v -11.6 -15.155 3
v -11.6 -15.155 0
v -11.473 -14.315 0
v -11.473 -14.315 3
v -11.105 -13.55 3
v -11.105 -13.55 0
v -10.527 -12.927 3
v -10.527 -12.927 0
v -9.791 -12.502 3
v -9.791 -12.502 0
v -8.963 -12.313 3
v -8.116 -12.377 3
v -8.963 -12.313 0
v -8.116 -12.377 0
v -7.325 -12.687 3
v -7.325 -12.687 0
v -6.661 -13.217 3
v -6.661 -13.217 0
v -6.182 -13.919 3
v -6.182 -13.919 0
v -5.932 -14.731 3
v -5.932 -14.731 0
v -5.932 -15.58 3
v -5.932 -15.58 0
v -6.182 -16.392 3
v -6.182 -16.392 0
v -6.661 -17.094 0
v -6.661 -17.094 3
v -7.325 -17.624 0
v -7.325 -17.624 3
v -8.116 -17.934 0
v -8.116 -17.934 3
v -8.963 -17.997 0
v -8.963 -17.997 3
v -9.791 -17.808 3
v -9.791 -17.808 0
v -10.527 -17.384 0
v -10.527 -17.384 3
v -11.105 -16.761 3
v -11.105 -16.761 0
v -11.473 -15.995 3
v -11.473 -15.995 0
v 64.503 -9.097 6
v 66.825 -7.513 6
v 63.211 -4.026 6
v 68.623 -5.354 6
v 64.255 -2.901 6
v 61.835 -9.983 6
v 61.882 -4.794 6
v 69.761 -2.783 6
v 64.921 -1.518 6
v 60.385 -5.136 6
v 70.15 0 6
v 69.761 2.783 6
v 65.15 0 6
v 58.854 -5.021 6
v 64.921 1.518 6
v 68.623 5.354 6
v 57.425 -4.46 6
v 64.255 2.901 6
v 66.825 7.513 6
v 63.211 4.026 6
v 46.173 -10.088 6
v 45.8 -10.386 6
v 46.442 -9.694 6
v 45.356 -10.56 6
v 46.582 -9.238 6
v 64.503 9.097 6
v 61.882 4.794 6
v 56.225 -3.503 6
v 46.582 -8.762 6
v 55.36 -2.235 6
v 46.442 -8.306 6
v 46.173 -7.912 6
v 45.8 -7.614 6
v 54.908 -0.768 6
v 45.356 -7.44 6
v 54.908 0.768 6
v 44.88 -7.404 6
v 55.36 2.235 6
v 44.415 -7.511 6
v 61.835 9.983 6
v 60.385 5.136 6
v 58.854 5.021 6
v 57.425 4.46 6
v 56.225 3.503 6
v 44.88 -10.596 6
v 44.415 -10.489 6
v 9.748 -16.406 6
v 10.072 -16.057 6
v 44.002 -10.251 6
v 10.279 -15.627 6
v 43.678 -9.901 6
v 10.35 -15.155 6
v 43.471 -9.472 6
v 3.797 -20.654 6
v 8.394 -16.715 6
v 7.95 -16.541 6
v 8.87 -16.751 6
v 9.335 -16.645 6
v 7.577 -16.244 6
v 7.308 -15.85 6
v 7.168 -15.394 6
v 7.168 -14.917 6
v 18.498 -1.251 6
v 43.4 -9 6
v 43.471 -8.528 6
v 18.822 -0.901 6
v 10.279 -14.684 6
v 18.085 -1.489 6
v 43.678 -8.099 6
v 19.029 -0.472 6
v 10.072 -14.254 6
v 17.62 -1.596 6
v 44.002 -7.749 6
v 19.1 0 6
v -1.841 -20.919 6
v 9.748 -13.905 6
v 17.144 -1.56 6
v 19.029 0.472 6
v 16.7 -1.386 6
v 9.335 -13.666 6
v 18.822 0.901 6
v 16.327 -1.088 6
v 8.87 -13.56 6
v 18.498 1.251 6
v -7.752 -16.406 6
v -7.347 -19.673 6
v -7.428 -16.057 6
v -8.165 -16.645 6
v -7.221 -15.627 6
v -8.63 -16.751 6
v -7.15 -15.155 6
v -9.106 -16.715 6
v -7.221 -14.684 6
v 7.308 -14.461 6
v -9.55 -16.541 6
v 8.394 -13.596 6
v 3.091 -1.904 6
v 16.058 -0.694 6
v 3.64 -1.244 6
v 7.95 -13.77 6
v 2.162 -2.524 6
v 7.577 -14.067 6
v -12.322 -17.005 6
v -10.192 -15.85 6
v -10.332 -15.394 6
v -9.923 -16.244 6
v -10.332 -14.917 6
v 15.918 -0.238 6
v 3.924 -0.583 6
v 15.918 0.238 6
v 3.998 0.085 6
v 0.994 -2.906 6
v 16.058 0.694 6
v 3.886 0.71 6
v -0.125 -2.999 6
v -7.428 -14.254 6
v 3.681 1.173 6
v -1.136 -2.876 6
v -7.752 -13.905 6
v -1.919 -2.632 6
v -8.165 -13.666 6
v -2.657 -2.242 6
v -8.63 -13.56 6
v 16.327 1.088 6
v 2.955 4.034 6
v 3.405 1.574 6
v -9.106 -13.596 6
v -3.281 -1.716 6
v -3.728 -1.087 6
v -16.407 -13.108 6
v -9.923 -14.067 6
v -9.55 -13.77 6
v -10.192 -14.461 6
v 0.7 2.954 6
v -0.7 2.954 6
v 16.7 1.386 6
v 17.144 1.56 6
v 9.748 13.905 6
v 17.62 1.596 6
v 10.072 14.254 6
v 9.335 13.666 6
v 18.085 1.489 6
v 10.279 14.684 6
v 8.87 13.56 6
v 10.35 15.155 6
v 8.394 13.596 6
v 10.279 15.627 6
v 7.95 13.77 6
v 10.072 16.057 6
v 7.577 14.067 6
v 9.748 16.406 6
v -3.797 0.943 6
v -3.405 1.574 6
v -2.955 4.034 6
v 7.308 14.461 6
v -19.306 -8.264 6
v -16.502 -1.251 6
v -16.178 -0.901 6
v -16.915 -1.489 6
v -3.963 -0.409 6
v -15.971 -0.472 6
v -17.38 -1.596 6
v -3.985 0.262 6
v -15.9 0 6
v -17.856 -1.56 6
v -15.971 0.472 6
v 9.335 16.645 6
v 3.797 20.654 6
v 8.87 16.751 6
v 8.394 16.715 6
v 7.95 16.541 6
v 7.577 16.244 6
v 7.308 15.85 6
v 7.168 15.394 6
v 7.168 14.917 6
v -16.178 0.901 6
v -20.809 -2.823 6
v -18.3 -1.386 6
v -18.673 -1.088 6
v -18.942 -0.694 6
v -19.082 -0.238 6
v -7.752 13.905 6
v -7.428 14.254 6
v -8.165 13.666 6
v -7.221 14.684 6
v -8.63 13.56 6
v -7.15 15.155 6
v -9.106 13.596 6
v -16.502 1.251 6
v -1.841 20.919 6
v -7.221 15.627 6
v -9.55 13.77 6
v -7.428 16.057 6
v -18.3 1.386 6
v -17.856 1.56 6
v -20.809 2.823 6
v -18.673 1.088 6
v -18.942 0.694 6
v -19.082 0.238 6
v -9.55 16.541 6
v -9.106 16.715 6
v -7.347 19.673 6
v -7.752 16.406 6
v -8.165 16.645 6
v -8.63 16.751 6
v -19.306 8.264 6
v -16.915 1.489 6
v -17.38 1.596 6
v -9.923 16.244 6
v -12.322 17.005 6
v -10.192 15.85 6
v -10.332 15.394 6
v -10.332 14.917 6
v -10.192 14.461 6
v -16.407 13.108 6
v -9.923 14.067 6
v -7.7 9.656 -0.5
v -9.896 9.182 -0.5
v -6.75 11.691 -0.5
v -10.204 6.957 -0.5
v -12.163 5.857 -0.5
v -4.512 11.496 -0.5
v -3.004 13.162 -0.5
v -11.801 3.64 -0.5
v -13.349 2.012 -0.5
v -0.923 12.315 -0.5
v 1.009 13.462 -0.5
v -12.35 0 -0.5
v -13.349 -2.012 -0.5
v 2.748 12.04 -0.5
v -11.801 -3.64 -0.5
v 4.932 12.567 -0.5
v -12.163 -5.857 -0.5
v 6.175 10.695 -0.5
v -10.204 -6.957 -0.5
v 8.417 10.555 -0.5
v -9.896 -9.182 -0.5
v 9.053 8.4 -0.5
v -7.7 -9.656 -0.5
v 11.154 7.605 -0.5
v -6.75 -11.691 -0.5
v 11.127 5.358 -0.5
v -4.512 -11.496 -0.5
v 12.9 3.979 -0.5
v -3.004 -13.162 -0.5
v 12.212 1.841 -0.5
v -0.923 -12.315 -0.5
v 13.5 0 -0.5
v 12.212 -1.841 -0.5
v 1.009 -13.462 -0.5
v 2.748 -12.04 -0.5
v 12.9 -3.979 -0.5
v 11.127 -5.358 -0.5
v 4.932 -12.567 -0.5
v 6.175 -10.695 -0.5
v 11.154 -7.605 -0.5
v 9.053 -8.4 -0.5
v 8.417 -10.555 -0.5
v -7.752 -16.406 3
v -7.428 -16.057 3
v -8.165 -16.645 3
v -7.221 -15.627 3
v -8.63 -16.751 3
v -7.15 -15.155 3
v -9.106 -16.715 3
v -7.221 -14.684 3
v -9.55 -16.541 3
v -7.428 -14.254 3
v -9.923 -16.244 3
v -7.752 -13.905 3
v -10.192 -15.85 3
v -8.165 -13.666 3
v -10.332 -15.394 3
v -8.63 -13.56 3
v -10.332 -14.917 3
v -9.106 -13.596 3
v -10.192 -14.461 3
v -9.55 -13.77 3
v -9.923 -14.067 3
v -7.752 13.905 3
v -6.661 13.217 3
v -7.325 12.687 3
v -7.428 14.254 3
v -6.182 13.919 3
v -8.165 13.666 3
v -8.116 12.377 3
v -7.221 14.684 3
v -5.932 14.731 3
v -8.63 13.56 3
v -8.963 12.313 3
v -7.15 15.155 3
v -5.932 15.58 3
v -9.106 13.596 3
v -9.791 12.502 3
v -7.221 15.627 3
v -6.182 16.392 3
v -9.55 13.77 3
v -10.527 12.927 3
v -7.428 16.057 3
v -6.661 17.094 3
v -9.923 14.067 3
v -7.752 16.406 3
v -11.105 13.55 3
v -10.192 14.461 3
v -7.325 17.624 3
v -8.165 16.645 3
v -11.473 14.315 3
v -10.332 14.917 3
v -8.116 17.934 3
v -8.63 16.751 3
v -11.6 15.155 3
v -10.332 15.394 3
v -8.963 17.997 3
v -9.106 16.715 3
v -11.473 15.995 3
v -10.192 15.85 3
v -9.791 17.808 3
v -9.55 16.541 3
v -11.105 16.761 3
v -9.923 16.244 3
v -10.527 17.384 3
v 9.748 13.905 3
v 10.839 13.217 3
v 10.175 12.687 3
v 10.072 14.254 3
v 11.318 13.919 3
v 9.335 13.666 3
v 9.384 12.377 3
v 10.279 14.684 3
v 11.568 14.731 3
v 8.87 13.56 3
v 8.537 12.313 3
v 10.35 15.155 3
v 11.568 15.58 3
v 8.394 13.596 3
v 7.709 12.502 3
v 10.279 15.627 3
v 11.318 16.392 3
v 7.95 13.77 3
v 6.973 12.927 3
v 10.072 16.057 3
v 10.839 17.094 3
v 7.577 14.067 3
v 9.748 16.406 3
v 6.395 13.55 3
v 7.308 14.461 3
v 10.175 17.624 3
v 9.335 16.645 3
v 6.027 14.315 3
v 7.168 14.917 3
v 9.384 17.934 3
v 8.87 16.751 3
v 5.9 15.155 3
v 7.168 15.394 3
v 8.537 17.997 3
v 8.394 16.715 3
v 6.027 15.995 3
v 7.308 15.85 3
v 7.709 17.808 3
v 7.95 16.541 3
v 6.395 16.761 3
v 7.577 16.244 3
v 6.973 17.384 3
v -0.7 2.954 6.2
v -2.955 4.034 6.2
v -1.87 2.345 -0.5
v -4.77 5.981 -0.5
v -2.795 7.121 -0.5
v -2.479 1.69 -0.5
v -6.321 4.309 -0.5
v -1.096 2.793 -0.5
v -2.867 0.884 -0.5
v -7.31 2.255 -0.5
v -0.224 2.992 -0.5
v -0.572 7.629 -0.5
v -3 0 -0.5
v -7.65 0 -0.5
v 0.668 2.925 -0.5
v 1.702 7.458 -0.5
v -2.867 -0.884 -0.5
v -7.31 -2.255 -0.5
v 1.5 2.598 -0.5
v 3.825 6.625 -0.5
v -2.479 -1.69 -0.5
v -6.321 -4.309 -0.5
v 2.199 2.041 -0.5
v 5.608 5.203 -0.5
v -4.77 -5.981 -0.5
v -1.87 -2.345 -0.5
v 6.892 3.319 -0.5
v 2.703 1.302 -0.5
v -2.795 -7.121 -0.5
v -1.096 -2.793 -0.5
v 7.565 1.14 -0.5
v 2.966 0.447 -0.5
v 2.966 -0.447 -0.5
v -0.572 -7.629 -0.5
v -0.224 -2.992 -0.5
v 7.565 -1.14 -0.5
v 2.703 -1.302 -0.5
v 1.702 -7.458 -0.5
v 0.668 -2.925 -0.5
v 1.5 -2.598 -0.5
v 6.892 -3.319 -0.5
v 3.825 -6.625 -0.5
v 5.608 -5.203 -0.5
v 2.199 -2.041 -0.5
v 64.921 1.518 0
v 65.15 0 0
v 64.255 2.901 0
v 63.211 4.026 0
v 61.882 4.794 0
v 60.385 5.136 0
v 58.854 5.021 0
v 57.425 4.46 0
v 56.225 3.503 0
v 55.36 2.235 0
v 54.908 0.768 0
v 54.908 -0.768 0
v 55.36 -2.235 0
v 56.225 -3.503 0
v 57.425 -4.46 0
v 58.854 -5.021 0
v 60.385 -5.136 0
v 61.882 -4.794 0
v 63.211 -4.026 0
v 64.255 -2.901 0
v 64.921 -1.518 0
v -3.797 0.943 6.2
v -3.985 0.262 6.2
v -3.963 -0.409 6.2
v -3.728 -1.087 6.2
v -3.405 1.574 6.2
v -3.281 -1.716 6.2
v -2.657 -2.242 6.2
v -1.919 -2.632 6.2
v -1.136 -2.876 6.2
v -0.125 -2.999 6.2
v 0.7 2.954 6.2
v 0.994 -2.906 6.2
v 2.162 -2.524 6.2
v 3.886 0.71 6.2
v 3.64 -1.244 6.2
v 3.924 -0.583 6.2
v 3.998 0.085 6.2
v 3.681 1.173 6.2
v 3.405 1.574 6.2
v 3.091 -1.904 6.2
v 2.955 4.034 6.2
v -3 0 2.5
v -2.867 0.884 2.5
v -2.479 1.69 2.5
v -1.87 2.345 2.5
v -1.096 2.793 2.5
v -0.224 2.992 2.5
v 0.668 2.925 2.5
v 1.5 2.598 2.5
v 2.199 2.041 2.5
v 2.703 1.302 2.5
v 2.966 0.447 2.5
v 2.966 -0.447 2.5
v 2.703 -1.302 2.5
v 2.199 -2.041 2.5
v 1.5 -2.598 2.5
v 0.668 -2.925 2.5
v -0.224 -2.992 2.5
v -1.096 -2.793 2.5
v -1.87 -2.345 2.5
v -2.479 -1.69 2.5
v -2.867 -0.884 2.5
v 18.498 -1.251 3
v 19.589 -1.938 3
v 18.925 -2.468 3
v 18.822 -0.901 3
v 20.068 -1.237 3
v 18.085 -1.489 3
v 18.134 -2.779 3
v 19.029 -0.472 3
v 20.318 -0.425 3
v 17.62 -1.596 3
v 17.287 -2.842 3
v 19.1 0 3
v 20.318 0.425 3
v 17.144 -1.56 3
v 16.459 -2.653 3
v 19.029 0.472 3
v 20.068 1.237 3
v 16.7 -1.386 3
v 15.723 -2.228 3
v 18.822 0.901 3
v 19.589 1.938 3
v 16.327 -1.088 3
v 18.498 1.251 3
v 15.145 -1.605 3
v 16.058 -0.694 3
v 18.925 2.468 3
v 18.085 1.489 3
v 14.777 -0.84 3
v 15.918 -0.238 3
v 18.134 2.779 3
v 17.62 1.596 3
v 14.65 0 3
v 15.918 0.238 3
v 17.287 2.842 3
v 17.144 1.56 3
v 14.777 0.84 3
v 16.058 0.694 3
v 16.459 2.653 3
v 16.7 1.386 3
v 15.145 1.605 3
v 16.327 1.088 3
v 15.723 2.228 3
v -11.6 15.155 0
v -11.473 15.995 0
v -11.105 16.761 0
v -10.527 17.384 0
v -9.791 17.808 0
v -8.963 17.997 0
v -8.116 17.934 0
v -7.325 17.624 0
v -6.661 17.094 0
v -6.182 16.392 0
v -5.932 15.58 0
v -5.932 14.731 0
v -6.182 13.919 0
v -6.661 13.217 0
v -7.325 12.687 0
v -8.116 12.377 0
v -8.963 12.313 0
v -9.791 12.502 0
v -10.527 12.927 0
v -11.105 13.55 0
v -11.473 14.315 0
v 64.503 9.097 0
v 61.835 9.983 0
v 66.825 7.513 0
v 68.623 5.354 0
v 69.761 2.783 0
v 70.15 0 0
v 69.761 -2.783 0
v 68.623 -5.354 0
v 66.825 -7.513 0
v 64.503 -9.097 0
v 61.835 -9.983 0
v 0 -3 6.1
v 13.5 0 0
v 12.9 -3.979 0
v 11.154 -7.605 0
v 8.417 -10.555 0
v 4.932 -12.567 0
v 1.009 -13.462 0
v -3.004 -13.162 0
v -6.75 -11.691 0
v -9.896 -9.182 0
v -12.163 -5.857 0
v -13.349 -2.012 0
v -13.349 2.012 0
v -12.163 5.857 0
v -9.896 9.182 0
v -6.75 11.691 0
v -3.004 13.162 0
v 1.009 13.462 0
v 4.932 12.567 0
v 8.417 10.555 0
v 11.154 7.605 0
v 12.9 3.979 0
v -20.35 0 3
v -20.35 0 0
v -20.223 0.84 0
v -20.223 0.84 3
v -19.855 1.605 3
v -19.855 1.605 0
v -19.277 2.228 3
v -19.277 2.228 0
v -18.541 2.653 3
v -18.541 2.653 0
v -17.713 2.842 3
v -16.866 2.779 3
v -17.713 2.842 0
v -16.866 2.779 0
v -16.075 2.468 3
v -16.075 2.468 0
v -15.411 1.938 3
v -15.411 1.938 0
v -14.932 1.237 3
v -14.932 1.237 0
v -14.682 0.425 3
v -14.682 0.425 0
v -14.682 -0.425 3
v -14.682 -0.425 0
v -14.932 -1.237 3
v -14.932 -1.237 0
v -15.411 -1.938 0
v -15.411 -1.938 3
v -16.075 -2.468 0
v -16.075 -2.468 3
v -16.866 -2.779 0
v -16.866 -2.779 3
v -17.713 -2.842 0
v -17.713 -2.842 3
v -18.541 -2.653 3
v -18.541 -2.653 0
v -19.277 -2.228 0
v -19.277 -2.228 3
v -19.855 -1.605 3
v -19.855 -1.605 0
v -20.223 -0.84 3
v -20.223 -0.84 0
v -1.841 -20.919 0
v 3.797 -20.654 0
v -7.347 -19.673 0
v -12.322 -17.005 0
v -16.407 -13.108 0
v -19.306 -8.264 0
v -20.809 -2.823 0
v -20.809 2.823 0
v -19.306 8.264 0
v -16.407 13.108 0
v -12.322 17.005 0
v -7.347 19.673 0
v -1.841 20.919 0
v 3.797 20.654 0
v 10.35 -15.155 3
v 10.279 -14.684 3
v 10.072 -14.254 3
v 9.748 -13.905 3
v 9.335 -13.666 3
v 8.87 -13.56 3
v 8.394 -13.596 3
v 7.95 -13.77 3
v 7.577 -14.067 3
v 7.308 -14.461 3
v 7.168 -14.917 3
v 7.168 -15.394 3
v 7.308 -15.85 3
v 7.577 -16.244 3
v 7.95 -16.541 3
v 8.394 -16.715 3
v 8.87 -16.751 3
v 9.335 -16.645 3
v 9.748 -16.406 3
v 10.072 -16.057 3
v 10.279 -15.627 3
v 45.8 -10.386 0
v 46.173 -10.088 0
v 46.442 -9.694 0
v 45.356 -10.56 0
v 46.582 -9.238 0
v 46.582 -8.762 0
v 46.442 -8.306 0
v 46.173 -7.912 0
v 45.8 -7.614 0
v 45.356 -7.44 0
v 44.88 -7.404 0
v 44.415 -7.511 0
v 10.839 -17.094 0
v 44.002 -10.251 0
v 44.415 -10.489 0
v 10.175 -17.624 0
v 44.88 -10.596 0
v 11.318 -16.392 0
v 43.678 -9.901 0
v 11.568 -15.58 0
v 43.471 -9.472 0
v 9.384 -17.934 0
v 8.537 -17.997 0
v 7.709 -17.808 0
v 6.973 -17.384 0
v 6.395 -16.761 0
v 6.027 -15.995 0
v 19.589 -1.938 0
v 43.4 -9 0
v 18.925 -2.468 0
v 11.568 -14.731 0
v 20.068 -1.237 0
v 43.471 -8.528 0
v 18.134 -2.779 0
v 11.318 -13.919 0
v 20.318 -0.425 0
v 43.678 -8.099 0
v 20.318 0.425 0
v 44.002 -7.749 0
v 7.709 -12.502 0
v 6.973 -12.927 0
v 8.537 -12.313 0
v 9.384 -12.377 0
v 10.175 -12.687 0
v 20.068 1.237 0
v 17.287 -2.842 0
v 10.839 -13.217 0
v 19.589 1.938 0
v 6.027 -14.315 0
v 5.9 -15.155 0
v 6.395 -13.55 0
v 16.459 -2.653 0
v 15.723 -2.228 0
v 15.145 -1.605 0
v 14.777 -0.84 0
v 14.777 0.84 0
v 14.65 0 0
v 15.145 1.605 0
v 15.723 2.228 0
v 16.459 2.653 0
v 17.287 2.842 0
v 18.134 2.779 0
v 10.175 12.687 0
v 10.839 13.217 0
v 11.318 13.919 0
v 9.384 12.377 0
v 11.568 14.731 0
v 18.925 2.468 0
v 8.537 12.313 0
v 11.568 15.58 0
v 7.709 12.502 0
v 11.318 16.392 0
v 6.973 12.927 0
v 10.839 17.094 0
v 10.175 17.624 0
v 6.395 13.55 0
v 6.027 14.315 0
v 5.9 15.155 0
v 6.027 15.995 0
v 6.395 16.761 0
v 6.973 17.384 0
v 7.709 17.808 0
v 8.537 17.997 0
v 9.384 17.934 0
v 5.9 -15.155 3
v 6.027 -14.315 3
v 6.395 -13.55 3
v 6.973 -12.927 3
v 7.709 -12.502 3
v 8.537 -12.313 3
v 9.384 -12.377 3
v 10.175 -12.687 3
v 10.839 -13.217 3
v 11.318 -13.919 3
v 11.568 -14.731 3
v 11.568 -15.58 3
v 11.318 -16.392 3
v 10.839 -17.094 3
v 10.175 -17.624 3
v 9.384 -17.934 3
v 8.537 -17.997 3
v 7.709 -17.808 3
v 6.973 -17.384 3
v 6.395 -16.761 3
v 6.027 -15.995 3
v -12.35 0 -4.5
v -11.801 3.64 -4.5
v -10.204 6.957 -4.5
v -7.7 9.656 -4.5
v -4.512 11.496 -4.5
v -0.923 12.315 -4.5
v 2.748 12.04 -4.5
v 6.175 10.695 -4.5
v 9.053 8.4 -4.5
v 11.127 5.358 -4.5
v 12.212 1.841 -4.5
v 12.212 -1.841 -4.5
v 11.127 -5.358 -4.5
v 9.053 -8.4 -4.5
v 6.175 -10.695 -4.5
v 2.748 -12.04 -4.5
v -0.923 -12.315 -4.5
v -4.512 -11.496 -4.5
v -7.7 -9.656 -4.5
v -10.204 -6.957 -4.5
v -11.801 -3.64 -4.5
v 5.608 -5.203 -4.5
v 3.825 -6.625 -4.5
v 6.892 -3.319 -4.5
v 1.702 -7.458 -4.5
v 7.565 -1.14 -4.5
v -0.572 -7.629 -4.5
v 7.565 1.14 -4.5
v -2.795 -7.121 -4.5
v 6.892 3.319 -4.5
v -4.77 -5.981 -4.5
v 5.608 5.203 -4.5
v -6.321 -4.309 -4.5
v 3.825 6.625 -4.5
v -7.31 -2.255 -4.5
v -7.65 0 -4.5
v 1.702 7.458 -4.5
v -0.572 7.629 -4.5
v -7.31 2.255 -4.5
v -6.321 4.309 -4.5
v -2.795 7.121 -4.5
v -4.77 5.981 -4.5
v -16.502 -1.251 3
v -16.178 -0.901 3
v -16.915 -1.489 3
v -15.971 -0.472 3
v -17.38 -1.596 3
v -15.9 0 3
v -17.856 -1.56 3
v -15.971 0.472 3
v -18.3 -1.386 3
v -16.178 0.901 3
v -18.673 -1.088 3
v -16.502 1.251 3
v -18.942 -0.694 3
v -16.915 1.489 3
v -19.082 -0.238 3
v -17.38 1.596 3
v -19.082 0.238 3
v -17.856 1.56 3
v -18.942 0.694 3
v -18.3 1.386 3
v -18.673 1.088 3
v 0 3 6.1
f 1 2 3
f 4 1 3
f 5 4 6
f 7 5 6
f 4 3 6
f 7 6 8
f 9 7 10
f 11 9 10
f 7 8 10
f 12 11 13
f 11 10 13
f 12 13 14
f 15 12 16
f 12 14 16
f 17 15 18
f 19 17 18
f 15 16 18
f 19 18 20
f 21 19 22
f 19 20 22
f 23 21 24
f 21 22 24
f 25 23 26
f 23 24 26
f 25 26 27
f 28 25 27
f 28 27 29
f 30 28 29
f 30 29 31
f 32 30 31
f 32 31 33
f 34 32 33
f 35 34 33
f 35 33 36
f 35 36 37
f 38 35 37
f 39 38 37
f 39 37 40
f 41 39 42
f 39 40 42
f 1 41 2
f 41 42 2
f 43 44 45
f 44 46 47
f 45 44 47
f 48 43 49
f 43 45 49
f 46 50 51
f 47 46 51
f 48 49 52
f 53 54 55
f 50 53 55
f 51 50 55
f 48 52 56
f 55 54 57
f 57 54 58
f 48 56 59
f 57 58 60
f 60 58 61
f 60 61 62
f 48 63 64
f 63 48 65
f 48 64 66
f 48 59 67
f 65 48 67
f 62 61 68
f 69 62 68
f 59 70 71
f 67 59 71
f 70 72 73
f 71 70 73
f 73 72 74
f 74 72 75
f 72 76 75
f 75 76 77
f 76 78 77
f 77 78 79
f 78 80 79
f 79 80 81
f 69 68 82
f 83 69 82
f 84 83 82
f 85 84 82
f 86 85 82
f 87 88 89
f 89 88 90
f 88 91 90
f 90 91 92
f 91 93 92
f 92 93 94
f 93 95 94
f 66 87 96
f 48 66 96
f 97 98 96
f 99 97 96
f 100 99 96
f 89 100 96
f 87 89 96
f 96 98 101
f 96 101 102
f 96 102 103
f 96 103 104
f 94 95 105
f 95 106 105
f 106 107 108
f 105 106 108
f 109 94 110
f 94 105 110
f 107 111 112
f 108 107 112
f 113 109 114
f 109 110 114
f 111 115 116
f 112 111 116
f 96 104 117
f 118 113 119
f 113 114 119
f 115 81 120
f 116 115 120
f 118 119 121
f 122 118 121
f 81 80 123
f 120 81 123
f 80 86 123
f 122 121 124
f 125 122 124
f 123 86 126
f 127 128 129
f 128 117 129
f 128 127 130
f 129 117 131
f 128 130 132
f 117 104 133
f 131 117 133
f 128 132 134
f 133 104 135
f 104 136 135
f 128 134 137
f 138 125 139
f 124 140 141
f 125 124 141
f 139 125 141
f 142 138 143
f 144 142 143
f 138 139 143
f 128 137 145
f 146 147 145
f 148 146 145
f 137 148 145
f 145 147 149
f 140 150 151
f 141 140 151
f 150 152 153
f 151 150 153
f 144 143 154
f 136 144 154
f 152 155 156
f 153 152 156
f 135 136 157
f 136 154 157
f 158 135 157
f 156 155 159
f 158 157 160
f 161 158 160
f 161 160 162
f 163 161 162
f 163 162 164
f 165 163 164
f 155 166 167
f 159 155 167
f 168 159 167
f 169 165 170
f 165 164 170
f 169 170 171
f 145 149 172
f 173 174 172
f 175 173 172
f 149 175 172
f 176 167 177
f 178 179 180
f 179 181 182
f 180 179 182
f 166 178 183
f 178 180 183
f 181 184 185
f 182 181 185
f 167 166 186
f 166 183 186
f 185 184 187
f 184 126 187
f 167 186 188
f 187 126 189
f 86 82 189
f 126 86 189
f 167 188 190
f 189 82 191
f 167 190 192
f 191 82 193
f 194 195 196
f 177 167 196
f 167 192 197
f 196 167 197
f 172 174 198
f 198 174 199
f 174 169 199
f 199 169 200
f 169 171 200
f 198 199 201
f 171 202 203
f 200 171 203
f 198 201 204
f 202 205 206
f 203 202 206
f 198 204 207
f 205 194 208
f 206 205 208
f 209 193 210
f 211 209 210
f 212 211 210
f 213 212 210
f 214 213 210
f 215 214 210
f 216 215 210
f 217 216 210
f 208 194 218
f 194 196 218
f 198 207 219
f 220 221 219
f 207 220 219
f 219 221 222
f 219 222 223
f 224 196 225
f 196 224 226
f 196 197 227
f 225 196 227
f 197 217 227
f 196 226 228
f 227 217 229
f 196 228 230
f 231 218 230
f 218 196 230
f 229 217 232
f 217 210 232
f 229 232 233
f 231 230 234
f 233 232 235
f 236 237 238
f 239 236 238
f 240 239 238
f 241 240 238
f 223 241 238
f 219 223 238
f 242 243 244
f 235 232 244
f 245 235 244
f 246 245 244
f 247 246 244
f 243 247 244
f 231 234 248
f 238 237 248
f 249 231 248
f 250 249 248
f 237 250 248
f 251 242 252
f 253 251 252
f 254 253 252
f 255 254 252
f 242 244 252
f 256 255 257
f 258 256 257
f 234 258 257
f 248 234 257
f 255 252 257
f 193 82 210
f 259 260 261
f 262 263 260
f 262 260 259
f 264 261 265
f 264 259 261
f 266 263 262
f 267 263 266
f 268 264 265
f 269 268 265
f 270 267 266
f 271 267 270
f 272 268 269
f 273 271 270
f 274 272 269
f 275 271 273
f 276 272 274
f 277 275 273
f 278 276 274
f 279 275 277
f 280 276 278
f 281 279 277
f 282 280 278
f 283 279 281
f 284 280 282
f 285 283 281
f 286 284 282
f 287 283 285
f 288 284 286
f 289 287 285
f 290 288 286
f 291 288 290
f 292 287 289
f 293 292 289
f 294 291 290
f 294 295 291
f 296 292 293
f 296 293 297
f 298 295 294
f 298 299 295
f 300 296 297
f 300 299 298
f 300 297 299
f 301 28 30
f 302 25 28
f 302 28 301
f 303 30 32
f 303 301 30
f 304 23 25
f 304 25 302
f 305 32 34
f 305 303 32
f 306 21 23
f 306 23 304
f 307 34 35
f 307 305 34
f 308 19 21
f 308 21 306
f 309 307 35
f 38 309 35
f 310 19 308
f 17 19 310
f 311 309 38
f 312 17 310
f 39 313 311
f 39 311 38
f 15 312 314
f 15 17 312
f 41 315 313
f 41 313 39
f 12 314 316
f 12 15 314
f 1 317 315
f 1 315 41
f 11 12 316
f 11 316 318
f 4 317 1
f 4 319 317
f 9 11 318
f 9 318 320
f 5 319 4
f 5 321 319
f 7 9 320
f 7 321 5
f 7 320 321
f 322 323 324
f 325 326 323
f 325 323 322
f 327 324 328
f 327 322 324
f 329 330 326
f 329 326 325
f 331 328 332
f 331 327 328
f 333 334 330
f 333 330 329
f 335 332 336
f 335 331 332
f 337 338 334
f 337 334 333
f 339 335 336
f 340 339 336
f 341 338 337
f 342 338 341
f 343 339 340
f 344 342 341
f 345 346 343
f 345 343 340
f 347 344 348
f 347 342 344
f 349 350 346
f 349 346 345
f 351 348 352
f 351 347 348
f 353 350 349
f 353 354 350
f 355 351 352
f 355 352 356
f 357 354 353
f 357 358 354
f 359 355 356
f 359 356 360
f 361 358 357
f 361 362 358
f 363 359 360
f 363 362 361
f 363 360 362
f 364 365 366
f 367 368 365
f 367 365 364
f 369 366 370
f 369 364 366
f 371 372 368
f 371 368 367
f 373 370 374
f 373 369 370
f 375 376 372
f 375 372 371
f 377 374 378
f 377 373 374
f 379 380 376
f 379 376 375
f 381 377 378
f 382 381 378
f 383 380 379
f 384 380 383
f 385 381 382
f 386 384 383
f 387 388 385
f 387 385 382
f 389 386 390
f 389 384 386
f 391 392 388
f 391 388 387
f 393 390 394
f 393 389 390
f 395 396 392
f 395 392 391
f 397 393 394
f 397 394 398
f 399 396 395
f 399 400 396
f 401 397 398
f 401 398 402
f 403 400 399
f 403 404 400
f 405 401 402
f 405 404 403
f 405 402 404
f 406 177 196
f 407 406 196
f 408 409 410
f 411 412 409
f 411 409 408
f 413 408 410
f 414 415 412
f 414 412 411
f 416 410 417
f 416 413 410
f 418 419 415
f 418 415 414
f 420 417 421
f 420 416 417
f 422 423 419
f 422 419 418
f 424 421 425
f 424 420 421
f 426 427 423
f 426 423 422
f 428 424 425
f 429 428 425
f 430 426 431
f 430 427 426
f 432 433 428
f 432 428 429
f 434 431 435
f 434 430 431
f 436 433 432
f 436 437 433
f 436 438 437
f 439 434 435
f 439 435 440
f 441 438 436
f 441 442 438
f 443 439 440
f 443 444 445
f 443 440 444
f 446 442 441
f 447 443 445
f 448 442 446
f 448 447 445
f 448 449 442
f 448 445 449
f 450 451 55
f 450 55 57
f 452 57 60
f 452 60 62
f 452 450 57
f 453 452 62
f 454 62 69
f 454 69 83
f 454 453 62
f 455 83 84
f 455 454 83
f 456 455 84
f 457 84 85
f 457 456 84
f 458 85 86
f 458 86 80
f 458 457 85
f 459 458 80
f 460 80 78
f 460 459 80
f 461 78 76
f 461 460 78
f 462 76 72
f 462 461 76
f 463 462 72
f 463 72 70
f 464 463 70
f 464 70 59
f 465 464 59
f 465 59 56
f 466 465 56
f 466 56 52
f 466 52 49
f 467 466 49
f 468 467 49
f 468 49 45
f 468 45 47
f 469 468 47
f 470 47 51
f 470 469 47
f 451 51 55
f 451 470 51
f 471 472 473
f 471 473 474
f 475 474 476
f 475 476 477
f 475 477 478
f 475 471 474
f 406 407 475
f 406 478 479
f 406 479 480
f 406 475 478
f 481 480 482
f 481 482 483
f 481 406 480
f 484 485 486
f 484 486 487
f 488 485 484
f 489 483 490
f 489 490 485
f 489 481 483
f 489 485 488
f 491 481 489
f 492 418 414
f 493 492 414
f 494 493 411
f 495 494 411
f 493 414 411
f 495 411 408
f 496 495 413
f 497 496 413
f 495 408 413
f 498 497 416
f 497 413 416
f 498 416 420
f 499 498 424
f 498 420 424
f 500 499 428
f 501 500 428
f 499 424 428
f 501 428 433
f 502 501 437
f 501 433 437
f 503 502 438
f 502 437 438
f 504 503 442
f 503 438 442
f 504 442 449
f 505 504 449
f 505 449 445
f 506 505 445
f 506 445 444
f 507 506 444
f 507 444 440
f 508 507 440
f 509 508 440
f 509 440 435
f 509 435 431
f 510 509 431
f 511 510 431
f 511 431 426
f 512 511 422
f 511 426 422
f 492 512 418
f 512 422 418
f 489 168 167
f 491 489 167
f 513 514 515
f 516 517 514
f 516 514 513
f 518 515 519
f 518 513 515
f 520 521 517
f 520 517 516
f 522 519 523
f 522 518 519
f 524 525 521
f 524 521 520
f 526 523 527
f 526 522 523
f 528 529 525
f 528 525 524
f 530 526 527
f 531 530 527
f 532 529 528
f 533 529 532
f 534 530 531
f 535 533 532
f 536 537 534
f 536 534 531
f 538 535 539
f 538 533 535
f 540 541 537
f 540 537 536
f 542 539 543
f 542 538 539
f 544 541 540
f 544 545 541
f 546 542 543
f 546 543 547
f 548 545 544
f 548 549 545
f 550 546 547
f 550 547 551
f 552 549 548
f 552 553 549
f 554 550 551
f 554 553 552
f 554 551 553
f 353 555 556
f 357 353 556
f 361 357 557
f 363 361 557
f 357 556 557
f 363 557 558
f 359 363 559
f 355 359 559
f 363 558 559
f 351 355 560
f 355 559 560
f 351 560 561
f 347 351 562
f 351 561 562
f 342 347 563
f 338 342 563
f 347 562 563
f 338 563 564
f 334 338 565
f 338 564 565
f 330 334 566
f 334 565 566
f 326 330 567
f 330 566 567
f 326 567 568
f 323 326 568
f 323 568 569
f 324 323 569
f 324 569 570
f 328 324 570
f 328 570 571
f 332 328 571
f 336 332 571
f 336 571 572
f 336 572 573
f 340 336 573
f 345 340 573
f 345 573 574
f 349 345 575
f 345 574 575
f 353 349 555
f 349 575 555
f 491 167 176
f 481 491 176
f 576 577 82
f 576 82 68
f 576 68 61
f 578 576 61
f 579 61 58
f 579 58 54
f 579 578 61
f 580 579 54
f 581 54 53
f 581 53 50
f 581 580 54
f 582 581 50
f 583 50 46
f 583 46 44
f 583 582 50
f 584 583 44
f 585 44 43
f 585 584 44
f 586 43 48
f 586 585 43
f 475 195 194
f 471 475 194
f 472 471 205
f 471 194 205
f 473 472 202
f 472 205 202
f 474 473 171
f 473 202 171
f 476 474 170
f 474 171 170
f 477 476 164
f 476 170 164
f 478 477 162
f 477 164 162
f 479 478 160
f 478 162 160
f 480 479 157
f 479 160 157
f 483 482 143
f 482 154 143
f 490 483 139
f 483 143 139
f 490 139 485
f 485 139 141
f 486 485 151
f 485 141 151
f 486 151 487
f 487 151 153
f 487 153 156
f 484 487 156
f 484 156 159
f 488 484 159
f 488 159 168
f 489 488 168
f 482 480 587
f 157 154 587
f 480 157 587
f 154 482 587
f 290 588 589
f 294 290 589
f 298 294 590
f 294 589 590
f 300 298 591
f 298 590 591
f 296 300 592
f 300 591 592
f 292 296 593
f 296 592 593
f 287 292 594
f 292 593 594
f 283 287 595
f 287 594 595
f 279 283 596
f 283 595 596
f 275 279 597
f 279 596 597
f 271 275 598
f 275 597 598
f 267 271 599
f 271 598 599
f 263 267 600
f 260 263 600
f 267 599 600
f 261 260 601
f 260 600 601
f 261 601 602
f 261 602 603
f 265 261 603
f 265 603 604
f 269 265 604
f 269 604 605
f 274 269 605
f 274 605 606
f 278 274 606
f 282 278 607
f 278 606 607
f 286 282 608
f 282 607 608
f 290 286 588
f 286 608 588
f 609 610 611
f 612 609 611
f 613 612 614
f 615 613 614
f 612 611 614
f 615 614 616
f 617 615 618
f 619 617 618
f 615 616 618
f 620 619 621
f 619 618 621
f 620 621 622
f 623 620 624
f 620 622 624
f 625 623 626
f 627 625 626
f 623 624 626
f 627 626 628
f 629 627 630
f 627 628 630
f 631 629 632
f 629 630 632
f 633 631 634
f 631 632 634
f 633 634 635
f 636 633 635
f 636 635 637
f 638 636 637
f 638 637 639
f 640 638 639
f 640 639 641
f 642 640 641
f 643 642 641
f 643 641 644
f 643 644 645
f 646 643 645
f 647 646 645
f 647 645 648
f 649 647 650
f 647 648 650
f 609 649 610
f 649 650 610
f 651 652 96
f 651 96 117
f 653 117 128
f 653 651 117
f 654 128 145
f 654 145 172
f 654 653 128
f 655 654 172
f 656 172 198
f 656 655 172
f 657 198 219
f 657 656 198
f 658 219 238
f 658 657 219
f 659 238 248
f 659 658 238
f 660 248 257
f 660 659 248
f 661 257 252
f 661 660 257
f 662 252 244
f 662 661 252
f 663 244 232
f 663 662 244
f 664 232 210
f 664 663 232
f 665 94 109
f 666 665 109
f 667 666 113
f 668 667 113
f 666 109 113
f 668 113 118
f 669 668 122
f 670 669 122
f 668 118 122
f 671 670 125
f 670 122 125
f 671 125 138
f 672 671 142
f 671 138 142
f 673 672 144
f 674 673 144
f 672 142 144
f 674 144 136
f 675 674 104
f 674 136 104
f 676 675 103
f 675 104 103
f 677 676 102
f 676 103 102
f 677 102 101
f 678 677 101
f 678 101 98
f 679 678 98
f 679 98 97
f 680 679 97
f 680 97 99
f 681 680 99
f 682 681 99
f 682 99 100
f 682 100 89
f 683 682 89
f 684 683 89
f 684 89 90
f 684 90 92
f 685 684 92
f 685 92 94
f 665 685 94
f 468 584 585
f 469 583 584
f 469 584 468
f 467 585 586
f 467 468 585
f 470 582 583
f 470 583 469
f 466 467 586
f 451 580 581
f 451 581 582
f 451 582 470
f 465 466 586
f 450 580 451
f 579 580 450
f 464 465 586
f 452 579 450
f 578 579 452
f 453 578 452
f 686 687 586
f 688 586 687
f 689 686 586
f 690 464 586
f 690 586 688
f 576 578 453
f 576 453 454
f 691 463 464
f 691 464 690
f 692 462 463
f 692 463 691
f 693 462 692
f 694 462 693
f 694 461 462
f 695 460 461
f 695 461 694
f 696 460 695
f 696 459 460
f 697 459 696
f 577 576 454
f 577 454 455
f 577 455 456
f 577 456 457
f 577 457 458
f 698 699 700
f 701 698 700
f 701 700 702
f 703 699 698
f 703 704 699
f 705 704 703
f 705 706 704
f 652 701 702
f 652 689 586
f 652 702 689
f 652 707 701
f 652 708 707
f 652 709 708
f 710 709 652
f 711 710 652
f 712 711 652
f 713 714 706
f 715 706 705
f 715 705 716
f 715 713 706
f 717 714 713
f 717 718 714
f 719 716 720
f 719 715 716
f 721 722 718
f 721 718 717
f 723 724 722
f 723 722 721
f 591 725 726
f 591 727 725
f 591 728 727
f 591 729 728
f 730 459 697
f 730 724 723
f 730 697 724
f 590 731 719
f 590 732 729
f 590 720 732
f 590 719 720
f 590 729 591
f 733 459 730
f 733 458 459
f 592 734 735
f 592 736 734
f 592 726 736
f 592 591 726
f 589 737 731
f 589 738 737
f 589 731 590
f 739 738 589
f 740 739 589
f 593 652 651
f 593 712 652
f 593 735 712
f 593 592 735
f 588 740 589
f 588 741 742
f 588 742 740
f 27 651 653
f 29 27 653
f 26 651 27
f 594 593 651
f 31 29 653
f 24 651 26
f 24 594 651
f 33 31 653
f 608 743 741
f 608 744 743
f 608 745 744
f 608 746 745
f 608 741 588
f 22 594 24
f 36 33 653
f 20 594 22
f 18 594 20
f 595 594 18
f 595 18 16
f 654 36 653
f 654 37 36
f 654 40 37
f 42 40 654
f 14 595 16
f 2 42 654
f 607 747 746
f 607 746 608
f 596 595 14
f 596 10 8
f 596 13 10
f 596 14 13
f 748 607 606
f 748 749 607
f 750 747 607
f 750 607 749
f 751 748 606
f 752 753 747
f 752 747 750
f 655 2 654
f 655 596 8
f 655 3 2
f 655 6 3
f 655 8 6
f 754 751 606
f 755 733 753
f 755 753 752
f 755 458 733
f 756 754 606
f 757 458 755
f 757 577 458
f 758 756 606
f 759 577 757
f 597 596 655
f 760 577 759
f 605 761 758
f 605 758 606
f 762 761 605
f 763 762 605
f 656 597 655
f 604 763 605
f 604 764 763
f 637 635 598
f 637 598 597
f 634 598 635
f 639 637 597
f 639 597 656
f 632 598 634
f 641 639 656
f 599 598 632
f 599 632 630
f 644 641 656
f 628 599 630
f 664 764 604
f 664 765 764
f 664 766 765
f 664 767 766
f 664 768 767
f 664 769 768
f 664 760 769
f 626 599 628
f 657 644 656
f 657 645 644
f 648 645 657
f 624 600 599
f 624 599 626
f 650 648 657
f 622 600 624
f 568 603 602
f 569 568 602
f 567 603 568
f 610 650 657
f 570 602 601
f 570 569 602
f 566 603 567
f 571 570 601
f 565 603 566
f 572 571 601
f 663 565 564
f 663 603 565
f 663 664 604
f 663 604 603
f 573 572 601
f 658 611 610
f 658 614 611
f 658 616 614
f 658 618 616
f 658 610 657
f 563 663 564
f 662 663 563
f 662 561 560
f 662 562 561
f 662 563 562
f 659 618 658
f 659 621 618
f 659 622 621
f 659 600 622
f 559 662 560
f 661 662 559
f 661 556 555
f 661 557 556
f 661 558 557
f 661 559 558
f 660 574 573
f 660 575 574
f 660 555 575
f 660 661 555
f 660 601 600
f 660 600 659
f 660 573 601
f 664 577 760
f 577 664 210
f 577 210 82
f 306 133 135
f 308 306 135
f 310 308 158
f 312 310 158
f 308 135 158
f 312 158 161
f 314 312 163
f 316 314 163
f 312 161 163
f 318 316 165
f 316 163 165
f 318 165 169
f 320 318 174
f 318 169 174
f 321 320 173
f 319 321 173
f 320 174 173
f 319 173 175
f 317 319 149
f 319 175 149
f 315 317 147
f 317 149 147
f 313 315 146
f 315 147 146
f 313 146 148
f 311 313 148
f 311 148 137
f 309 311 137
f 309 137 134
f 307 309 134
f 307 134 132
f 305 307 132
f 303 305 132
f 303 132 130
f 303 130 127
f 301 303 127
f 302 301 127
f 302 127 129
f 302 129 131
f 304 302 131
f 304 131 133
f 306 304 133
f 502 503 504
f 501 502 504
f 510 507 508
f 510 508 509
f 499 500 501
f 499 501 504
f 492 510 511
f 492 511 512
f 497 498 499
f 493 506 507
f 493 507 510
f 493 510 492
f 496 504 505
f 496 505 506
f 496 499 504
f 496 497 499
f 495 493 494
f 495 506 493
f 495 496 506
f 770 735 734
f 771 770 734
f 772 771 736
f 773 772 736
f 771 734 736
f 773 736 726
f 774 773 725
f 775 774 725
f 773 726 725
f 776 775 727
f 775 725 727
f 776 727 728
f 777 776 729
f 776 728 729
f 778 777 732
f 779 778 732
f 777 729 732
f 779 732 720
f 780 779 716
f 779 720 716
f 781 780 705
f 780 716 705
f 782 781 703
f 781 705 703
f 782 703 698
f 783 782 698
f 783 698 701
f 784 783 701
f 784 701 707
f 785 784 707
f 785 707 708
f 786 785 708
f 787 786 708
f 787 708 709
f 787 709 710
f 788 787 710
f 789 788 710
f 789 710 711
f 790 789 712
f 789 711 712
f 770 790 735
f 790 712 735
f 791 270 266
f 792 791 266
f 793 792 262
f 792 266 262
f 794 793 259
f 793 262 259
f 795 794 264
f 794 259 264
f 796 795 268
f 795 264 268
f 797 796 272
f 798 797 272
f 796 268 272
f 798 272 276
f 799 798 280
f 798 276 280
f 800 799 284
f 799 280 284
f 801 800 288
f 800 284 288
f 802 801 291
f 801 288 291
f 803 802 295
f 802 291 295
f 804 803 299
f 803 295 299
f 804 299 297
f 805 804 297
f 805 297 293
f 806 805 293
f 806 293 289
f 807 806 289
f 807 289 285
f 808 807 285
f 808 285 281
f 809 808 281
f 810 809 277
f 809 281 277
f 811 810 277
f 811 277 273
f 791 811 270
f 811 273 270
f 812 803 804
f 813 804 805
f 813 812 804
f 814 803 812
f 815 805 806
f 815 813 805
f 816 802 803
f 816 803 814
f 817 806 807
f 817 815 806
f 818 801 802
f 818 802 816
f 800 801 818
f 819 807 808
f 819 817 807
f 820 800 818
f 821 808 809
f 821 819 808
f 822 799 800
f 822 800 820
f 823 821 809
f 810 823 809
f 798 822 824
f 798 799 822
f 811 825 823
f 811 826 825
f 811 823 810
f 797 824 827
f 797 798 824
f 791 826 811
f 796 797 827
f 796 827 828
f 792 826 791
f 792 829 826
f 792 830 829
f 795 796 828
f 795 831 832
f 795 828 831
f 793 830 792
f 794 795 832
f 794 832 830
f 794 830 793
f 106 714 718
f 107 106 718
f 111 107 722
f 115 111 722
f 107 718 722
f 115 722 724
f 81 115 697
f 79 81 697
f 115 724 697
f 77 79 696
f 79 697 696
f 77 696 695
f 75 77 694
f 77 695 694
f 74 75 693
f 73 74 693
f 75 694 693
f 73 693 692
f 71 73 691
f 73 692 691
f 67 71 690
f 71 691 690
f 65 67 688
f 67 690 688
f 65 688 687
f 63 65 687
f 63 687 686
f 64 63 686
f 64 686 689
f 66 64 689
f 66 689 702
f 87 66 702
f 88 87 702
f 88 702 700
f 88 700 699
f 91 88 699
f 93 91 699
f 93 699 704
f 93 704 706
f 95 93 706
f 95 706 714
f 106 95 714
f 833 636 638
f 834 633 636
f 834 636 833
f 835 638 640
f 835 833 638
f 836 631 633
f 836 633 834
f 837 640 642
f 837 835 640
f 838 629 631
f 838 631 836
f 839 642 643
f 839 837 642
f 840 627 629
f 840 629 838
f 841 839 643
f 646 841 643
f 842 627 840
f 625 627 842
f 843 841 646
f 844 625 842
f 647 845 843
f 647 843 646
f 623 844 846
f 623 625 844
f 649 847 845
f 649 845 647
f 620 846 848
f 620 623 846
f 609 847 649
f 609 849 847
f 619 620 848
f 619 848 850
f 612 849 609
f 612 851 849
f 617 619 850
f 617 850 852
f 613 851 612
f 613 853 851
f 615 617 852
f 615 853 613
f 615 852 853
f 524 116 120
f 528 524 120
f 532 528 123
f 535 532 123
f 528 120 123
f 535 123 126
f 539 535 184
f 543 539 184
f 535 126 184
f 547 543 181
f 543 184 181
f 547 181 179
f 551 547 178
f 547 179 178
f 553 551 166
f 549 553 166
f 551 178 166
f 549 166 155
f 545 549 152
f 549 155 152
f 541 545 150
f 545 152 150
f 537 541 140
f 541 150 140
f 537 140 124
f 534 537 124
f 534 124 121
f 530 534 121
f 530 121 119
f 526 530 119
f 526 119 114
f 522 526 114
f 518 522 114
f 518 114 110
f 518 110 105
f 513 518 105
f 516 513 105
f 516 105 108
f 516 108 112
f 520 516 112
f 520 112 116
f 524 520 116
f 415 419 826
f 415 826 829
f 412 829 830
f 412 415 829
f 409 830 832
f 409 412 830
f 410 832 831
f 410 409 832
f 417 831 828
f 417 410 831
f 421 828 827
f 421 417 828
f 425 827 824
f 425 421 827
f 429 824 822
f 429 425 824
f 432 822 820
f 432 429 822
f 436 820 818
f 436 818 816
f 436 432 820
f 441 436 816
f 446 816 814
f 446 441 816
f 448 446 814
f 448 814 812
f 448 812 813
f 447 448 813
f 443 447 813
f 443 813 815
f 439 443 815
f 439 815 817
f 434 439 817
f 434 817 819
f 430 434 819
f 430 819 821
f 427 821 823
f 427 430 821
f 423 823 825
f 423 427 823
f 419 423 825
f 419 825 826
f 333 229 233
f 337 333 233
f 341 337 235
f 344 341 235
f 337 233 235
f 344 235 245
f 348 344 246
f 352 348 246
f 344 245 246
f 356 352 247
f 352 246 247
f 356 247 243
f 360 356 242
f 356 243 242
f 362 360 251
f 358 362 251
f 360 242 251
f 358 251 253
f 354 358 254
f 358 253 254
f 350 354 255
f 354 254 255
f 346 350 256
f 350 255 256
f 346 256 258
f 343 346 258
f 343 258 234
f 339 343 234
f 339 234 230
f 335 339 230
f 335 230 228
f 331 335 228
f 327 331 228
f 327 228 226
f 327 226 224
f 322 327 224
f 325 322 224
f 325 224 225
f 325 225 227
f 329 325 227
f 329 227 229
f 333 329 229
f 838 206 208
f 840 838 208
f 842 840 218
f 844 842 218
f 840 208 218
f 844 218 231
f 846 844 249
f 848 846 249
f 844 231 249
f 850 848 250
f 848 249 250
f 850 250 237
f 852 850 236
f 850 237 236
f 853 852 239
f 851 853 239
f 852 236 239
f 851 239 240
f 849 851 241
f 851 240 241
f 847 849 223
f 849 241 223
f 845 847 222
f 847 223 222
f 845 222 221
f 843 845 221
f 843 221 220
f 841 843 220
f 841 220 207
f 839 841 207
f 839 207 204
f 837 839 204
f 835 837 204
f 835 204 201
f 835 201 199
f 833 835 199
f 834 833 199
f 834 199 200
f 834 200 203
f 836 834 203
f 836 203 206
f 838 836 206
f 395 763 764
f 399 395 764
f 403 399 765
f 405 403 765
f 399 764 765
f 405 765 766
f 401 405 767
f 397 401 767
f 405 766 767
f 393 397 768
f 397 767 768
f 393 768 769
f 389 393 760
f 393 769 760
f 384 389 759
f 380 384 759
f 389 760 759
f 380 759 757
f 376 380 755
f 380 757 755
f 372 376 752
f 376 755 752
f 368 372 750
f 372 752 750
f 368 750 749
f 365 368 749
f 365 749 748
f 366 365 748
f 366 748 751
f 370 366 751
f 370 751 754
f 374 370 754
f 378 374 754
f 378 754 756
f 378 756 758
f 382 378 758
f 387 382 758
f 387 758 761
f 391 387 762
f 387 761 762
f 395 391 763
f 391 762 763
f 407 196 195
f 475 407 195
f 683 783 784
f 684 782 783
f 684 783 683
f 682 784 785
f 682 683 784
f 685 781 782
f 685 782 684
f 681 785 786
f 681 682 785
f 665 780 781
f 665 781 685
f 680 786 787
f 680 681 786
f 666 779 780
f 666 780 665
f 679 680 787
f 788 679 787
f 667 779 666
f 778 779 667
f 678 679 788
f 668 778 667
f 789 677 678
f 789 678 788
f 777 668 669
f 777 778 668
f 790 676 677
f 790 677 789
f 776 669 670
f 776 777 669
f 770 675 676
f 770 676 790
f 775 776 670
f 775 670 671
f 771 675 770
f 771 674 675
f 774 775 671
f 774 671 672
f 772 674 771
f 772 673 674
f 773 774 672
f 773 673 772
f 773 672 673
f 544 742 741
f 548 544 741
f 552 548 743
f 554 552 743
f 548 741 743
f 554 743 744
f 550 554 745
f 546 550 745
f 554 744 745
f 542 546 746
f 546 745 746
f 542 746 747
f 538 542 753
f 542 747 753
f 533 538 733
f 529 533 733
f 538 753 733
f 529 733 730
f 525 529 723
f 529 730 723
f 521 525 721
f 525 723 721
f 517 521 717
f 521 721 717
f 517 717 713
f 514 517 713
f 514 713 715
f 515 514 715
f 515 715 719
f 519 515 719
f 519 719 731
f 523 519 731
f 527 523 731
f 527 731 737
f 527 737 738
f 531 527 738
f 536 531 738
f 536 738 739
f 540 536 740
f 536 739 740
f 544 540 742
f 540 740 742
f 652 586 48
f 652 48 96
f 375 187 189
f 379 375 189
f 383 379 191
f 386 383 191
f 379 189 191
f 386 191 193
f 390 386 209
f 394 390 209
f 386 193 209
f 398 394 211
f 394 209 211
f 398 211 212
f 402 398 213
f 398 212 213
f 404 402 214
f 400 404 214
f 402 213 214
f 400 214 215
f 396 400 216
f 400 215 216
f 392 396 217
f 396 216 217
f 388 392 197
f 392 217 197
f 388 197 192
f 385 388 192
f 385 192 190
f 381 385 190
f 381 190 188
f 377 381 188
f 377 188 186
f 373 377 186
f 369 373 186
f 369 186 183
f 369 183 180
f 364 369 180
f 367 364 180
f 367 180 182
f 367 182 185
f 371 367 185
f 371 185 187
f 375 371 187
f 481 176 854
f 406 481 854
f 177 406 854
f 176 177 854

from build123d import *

# Parameters (mm, degrees)
SKETCH_1_R          = 5.15
EXTRUDE_1_DEPTH     = 6
SKETCH_3_R          = 1.6
CUT_EXTRUDE_2_DEPTH = 74.471235868
SKETCH_5_R          = 13.5
EXTRUDE_3_DEPTH     = 0.5
SKETCH_4_R          = 12.35
SKETCH_4_R_2        = 7.65
EXTRUDE_2_DEPTH     = 4
SKETCH_6_R          = 3
CUT_EXTRUDE_3_DEPTH = 3
SKETCH_7_R          = 2.85
CUT_EXTRUDE_4_DEPTH = 3
EXTRUDE_4_DEPTH     = 0.2
SKETCH_10_R         = 1.6
CUT_EXTRUDE_6_DEPTH = 74.487839262


with BuildPart() as part:
    # 草图1 → 凸台-拉伸1 (new body)
    with BuildSketch(Plane.XY):
        with BuildLine():
            Line((61.835458333, -9.98266461), (3.7975, -20.653788847))
            ThreePointArc((3.7975, -20.653788847), (-21, 0), (3.7975, 20.653788847))
            Line((3.7975, 20.653788847), (61.835458333, 9.98266461))
            ThreePointArc((61.835458333, 9.98266461), (70.15, 0), (61.835458333, -9.98266461))
        make_face()
        with Locations((60, 0)):
            Circle(SKETCH_1_R, mode=Mode.SUBTRACT)
    extrude(amount=EXTRUDE_1_DEPTH)

    # 草图3 → 切除-拉伸2 (cut, through all)
    with BuildSketch(Plane.XY.offset(6)):
        with Locations((8.75, 15.155444566)):
            Circle(SKETCH_3_R)
        with Locations((17.5, 0)):
            Circle(SKETCH_3_R)
        with Locations((8.75, -15.155444566)):
            Circle(SKETCH_3_R)
        with Locations((-8.75, -15.155444566)):
            Circle(SKETCH_3_R)
        with Locations((-17.5, 0)):
            Circle(SKETCH_3_R)
        with Locations((-8.75, 15.155444566)):
            Circle(SKETCH_3_R)
    extrude(amount=-CUT_EXTRUDE_2_DEPTH, mode=Mode.SUBTRACT)

    # 草图5 → 凸台-拉伸3 (add)
    with BuildSketch(Plane(origin=(0, 0, 0), x_dir=(-1, 0, 0), z_dir=(0, 0, -1))):
        with Locations(Location((0, 0, 0), (0, 0, 180))):
            Circle(SKETCH_5_R)
    extrude(amount=EXTRUDE_3_DEPTH)

    # 草图4 → 凸台-拉伸2 (add)
    with BuildSketch(Plane(origin=(0, 0, -0.5), x_dir=(-1, 0, 0), z_dir=(0, 0, -1))):
        Circle(SKETCH_4_R)
        Circle(SKETCH_4_R_2, mode=Mode.SUBTRACT)
    extrude(amount=EXTRUDE_2_DEPTH)

    # 草图6 → 切除-拉伸3 (cut)
    with BuildSketch(Plane(origin=(0, 0, -0.5), x_dir=(-1, 0, 0), z_dir=(0, 0, -1))):
        Circle(SKETCH_6_R)
    extrude(amount=-CUT_EXTRUDE_3_DEPTH, mode=Mode.SUBTRACT)

    # 草图7 → 切除-拉伸4 (cut)
    with BuildSketch(Plane(origin=(0, 0, 0), x_dir=(-1, 0, 0), z_dir=(0, 0, -1))):
        with Locations((8.75, 15.155444566)):
            Circle(SKETCH_7_R)
        with Locations((17.5, 0)):
            Circle(SKETCH_7_R)
        with Locations((8.75, -15.155444566)):
            Circle(SKETCH_7_R)
        with Locations((-8.75, -15.155444566)):
            Circle(SKETCH_7_R)
        with Locations((-17.5, 0)):
            Circle(SKETCH_7_R)
        with Locations((-8.75, 15.155444566)):
            Circle(SKETCH_7_R)
    extrude(amount=-CUT_EXTRUDE_4_DEPTH, mode=Mode.SUBTRACT)

    # 草图9 → 凸台-拉伸4 (add)
    with BuildSketch(Plane.XY.offset(6)):
        with BuildLine():
            Line((-2.954769624, 4.033526555), (-3.40491347, 1.574386356))
            add(Edge.make_bspline(
                [(-3.40491347, 1.574386356), (-7.165153372, -3), (0, -3), (7.165153372, -3), (3.40491347, 1.574386356)],
                knots=[2.589117856, 2.589117856, 2.589117856, 4.71238898, 4.71238898, 6.835660105, 6.835660105, 6.835660105], degree=2, weights=[1, 0.487444637, 1, 0.487444637, 1]))
            Line((3.40491347, 1.574386356), (2.954769624, 4.033526555))
            Line((2.954769624, 4.033526555), (0.7, 2.9537053))
            add(Edge.make_bspline(
                [(0.7, 2.9537053), (0, 3.047020297), (-0.7, 2.9537053)],
                knots=[1.394890559, 1.394890559, 1.394890559, 1.746702095, 1.746702095, 1.746702095], degree=2, weights=[1, 0.984568433, 1]))
            Line((-0.7, 2.9537053), (-2.954769624, 4.033526555))
        make_face()
    extrude(amount=EXTRUDE_4_DEPTH)

    # 草图10 → 切除-拉伸6 (cut, through all)
    with BuildSketch(Plane(origin=(0, 0, 0), x_dir=(-1, 0, 0), z_dir=(0, 0, -1))):
        with Locations((-45, -9)):
            Circle(SKETCH_10_R)
    extrude(amount=-CUT_EXTRUDE_6_DEPTH, mode=Mode.SUBTRACT)


solid = part.part
